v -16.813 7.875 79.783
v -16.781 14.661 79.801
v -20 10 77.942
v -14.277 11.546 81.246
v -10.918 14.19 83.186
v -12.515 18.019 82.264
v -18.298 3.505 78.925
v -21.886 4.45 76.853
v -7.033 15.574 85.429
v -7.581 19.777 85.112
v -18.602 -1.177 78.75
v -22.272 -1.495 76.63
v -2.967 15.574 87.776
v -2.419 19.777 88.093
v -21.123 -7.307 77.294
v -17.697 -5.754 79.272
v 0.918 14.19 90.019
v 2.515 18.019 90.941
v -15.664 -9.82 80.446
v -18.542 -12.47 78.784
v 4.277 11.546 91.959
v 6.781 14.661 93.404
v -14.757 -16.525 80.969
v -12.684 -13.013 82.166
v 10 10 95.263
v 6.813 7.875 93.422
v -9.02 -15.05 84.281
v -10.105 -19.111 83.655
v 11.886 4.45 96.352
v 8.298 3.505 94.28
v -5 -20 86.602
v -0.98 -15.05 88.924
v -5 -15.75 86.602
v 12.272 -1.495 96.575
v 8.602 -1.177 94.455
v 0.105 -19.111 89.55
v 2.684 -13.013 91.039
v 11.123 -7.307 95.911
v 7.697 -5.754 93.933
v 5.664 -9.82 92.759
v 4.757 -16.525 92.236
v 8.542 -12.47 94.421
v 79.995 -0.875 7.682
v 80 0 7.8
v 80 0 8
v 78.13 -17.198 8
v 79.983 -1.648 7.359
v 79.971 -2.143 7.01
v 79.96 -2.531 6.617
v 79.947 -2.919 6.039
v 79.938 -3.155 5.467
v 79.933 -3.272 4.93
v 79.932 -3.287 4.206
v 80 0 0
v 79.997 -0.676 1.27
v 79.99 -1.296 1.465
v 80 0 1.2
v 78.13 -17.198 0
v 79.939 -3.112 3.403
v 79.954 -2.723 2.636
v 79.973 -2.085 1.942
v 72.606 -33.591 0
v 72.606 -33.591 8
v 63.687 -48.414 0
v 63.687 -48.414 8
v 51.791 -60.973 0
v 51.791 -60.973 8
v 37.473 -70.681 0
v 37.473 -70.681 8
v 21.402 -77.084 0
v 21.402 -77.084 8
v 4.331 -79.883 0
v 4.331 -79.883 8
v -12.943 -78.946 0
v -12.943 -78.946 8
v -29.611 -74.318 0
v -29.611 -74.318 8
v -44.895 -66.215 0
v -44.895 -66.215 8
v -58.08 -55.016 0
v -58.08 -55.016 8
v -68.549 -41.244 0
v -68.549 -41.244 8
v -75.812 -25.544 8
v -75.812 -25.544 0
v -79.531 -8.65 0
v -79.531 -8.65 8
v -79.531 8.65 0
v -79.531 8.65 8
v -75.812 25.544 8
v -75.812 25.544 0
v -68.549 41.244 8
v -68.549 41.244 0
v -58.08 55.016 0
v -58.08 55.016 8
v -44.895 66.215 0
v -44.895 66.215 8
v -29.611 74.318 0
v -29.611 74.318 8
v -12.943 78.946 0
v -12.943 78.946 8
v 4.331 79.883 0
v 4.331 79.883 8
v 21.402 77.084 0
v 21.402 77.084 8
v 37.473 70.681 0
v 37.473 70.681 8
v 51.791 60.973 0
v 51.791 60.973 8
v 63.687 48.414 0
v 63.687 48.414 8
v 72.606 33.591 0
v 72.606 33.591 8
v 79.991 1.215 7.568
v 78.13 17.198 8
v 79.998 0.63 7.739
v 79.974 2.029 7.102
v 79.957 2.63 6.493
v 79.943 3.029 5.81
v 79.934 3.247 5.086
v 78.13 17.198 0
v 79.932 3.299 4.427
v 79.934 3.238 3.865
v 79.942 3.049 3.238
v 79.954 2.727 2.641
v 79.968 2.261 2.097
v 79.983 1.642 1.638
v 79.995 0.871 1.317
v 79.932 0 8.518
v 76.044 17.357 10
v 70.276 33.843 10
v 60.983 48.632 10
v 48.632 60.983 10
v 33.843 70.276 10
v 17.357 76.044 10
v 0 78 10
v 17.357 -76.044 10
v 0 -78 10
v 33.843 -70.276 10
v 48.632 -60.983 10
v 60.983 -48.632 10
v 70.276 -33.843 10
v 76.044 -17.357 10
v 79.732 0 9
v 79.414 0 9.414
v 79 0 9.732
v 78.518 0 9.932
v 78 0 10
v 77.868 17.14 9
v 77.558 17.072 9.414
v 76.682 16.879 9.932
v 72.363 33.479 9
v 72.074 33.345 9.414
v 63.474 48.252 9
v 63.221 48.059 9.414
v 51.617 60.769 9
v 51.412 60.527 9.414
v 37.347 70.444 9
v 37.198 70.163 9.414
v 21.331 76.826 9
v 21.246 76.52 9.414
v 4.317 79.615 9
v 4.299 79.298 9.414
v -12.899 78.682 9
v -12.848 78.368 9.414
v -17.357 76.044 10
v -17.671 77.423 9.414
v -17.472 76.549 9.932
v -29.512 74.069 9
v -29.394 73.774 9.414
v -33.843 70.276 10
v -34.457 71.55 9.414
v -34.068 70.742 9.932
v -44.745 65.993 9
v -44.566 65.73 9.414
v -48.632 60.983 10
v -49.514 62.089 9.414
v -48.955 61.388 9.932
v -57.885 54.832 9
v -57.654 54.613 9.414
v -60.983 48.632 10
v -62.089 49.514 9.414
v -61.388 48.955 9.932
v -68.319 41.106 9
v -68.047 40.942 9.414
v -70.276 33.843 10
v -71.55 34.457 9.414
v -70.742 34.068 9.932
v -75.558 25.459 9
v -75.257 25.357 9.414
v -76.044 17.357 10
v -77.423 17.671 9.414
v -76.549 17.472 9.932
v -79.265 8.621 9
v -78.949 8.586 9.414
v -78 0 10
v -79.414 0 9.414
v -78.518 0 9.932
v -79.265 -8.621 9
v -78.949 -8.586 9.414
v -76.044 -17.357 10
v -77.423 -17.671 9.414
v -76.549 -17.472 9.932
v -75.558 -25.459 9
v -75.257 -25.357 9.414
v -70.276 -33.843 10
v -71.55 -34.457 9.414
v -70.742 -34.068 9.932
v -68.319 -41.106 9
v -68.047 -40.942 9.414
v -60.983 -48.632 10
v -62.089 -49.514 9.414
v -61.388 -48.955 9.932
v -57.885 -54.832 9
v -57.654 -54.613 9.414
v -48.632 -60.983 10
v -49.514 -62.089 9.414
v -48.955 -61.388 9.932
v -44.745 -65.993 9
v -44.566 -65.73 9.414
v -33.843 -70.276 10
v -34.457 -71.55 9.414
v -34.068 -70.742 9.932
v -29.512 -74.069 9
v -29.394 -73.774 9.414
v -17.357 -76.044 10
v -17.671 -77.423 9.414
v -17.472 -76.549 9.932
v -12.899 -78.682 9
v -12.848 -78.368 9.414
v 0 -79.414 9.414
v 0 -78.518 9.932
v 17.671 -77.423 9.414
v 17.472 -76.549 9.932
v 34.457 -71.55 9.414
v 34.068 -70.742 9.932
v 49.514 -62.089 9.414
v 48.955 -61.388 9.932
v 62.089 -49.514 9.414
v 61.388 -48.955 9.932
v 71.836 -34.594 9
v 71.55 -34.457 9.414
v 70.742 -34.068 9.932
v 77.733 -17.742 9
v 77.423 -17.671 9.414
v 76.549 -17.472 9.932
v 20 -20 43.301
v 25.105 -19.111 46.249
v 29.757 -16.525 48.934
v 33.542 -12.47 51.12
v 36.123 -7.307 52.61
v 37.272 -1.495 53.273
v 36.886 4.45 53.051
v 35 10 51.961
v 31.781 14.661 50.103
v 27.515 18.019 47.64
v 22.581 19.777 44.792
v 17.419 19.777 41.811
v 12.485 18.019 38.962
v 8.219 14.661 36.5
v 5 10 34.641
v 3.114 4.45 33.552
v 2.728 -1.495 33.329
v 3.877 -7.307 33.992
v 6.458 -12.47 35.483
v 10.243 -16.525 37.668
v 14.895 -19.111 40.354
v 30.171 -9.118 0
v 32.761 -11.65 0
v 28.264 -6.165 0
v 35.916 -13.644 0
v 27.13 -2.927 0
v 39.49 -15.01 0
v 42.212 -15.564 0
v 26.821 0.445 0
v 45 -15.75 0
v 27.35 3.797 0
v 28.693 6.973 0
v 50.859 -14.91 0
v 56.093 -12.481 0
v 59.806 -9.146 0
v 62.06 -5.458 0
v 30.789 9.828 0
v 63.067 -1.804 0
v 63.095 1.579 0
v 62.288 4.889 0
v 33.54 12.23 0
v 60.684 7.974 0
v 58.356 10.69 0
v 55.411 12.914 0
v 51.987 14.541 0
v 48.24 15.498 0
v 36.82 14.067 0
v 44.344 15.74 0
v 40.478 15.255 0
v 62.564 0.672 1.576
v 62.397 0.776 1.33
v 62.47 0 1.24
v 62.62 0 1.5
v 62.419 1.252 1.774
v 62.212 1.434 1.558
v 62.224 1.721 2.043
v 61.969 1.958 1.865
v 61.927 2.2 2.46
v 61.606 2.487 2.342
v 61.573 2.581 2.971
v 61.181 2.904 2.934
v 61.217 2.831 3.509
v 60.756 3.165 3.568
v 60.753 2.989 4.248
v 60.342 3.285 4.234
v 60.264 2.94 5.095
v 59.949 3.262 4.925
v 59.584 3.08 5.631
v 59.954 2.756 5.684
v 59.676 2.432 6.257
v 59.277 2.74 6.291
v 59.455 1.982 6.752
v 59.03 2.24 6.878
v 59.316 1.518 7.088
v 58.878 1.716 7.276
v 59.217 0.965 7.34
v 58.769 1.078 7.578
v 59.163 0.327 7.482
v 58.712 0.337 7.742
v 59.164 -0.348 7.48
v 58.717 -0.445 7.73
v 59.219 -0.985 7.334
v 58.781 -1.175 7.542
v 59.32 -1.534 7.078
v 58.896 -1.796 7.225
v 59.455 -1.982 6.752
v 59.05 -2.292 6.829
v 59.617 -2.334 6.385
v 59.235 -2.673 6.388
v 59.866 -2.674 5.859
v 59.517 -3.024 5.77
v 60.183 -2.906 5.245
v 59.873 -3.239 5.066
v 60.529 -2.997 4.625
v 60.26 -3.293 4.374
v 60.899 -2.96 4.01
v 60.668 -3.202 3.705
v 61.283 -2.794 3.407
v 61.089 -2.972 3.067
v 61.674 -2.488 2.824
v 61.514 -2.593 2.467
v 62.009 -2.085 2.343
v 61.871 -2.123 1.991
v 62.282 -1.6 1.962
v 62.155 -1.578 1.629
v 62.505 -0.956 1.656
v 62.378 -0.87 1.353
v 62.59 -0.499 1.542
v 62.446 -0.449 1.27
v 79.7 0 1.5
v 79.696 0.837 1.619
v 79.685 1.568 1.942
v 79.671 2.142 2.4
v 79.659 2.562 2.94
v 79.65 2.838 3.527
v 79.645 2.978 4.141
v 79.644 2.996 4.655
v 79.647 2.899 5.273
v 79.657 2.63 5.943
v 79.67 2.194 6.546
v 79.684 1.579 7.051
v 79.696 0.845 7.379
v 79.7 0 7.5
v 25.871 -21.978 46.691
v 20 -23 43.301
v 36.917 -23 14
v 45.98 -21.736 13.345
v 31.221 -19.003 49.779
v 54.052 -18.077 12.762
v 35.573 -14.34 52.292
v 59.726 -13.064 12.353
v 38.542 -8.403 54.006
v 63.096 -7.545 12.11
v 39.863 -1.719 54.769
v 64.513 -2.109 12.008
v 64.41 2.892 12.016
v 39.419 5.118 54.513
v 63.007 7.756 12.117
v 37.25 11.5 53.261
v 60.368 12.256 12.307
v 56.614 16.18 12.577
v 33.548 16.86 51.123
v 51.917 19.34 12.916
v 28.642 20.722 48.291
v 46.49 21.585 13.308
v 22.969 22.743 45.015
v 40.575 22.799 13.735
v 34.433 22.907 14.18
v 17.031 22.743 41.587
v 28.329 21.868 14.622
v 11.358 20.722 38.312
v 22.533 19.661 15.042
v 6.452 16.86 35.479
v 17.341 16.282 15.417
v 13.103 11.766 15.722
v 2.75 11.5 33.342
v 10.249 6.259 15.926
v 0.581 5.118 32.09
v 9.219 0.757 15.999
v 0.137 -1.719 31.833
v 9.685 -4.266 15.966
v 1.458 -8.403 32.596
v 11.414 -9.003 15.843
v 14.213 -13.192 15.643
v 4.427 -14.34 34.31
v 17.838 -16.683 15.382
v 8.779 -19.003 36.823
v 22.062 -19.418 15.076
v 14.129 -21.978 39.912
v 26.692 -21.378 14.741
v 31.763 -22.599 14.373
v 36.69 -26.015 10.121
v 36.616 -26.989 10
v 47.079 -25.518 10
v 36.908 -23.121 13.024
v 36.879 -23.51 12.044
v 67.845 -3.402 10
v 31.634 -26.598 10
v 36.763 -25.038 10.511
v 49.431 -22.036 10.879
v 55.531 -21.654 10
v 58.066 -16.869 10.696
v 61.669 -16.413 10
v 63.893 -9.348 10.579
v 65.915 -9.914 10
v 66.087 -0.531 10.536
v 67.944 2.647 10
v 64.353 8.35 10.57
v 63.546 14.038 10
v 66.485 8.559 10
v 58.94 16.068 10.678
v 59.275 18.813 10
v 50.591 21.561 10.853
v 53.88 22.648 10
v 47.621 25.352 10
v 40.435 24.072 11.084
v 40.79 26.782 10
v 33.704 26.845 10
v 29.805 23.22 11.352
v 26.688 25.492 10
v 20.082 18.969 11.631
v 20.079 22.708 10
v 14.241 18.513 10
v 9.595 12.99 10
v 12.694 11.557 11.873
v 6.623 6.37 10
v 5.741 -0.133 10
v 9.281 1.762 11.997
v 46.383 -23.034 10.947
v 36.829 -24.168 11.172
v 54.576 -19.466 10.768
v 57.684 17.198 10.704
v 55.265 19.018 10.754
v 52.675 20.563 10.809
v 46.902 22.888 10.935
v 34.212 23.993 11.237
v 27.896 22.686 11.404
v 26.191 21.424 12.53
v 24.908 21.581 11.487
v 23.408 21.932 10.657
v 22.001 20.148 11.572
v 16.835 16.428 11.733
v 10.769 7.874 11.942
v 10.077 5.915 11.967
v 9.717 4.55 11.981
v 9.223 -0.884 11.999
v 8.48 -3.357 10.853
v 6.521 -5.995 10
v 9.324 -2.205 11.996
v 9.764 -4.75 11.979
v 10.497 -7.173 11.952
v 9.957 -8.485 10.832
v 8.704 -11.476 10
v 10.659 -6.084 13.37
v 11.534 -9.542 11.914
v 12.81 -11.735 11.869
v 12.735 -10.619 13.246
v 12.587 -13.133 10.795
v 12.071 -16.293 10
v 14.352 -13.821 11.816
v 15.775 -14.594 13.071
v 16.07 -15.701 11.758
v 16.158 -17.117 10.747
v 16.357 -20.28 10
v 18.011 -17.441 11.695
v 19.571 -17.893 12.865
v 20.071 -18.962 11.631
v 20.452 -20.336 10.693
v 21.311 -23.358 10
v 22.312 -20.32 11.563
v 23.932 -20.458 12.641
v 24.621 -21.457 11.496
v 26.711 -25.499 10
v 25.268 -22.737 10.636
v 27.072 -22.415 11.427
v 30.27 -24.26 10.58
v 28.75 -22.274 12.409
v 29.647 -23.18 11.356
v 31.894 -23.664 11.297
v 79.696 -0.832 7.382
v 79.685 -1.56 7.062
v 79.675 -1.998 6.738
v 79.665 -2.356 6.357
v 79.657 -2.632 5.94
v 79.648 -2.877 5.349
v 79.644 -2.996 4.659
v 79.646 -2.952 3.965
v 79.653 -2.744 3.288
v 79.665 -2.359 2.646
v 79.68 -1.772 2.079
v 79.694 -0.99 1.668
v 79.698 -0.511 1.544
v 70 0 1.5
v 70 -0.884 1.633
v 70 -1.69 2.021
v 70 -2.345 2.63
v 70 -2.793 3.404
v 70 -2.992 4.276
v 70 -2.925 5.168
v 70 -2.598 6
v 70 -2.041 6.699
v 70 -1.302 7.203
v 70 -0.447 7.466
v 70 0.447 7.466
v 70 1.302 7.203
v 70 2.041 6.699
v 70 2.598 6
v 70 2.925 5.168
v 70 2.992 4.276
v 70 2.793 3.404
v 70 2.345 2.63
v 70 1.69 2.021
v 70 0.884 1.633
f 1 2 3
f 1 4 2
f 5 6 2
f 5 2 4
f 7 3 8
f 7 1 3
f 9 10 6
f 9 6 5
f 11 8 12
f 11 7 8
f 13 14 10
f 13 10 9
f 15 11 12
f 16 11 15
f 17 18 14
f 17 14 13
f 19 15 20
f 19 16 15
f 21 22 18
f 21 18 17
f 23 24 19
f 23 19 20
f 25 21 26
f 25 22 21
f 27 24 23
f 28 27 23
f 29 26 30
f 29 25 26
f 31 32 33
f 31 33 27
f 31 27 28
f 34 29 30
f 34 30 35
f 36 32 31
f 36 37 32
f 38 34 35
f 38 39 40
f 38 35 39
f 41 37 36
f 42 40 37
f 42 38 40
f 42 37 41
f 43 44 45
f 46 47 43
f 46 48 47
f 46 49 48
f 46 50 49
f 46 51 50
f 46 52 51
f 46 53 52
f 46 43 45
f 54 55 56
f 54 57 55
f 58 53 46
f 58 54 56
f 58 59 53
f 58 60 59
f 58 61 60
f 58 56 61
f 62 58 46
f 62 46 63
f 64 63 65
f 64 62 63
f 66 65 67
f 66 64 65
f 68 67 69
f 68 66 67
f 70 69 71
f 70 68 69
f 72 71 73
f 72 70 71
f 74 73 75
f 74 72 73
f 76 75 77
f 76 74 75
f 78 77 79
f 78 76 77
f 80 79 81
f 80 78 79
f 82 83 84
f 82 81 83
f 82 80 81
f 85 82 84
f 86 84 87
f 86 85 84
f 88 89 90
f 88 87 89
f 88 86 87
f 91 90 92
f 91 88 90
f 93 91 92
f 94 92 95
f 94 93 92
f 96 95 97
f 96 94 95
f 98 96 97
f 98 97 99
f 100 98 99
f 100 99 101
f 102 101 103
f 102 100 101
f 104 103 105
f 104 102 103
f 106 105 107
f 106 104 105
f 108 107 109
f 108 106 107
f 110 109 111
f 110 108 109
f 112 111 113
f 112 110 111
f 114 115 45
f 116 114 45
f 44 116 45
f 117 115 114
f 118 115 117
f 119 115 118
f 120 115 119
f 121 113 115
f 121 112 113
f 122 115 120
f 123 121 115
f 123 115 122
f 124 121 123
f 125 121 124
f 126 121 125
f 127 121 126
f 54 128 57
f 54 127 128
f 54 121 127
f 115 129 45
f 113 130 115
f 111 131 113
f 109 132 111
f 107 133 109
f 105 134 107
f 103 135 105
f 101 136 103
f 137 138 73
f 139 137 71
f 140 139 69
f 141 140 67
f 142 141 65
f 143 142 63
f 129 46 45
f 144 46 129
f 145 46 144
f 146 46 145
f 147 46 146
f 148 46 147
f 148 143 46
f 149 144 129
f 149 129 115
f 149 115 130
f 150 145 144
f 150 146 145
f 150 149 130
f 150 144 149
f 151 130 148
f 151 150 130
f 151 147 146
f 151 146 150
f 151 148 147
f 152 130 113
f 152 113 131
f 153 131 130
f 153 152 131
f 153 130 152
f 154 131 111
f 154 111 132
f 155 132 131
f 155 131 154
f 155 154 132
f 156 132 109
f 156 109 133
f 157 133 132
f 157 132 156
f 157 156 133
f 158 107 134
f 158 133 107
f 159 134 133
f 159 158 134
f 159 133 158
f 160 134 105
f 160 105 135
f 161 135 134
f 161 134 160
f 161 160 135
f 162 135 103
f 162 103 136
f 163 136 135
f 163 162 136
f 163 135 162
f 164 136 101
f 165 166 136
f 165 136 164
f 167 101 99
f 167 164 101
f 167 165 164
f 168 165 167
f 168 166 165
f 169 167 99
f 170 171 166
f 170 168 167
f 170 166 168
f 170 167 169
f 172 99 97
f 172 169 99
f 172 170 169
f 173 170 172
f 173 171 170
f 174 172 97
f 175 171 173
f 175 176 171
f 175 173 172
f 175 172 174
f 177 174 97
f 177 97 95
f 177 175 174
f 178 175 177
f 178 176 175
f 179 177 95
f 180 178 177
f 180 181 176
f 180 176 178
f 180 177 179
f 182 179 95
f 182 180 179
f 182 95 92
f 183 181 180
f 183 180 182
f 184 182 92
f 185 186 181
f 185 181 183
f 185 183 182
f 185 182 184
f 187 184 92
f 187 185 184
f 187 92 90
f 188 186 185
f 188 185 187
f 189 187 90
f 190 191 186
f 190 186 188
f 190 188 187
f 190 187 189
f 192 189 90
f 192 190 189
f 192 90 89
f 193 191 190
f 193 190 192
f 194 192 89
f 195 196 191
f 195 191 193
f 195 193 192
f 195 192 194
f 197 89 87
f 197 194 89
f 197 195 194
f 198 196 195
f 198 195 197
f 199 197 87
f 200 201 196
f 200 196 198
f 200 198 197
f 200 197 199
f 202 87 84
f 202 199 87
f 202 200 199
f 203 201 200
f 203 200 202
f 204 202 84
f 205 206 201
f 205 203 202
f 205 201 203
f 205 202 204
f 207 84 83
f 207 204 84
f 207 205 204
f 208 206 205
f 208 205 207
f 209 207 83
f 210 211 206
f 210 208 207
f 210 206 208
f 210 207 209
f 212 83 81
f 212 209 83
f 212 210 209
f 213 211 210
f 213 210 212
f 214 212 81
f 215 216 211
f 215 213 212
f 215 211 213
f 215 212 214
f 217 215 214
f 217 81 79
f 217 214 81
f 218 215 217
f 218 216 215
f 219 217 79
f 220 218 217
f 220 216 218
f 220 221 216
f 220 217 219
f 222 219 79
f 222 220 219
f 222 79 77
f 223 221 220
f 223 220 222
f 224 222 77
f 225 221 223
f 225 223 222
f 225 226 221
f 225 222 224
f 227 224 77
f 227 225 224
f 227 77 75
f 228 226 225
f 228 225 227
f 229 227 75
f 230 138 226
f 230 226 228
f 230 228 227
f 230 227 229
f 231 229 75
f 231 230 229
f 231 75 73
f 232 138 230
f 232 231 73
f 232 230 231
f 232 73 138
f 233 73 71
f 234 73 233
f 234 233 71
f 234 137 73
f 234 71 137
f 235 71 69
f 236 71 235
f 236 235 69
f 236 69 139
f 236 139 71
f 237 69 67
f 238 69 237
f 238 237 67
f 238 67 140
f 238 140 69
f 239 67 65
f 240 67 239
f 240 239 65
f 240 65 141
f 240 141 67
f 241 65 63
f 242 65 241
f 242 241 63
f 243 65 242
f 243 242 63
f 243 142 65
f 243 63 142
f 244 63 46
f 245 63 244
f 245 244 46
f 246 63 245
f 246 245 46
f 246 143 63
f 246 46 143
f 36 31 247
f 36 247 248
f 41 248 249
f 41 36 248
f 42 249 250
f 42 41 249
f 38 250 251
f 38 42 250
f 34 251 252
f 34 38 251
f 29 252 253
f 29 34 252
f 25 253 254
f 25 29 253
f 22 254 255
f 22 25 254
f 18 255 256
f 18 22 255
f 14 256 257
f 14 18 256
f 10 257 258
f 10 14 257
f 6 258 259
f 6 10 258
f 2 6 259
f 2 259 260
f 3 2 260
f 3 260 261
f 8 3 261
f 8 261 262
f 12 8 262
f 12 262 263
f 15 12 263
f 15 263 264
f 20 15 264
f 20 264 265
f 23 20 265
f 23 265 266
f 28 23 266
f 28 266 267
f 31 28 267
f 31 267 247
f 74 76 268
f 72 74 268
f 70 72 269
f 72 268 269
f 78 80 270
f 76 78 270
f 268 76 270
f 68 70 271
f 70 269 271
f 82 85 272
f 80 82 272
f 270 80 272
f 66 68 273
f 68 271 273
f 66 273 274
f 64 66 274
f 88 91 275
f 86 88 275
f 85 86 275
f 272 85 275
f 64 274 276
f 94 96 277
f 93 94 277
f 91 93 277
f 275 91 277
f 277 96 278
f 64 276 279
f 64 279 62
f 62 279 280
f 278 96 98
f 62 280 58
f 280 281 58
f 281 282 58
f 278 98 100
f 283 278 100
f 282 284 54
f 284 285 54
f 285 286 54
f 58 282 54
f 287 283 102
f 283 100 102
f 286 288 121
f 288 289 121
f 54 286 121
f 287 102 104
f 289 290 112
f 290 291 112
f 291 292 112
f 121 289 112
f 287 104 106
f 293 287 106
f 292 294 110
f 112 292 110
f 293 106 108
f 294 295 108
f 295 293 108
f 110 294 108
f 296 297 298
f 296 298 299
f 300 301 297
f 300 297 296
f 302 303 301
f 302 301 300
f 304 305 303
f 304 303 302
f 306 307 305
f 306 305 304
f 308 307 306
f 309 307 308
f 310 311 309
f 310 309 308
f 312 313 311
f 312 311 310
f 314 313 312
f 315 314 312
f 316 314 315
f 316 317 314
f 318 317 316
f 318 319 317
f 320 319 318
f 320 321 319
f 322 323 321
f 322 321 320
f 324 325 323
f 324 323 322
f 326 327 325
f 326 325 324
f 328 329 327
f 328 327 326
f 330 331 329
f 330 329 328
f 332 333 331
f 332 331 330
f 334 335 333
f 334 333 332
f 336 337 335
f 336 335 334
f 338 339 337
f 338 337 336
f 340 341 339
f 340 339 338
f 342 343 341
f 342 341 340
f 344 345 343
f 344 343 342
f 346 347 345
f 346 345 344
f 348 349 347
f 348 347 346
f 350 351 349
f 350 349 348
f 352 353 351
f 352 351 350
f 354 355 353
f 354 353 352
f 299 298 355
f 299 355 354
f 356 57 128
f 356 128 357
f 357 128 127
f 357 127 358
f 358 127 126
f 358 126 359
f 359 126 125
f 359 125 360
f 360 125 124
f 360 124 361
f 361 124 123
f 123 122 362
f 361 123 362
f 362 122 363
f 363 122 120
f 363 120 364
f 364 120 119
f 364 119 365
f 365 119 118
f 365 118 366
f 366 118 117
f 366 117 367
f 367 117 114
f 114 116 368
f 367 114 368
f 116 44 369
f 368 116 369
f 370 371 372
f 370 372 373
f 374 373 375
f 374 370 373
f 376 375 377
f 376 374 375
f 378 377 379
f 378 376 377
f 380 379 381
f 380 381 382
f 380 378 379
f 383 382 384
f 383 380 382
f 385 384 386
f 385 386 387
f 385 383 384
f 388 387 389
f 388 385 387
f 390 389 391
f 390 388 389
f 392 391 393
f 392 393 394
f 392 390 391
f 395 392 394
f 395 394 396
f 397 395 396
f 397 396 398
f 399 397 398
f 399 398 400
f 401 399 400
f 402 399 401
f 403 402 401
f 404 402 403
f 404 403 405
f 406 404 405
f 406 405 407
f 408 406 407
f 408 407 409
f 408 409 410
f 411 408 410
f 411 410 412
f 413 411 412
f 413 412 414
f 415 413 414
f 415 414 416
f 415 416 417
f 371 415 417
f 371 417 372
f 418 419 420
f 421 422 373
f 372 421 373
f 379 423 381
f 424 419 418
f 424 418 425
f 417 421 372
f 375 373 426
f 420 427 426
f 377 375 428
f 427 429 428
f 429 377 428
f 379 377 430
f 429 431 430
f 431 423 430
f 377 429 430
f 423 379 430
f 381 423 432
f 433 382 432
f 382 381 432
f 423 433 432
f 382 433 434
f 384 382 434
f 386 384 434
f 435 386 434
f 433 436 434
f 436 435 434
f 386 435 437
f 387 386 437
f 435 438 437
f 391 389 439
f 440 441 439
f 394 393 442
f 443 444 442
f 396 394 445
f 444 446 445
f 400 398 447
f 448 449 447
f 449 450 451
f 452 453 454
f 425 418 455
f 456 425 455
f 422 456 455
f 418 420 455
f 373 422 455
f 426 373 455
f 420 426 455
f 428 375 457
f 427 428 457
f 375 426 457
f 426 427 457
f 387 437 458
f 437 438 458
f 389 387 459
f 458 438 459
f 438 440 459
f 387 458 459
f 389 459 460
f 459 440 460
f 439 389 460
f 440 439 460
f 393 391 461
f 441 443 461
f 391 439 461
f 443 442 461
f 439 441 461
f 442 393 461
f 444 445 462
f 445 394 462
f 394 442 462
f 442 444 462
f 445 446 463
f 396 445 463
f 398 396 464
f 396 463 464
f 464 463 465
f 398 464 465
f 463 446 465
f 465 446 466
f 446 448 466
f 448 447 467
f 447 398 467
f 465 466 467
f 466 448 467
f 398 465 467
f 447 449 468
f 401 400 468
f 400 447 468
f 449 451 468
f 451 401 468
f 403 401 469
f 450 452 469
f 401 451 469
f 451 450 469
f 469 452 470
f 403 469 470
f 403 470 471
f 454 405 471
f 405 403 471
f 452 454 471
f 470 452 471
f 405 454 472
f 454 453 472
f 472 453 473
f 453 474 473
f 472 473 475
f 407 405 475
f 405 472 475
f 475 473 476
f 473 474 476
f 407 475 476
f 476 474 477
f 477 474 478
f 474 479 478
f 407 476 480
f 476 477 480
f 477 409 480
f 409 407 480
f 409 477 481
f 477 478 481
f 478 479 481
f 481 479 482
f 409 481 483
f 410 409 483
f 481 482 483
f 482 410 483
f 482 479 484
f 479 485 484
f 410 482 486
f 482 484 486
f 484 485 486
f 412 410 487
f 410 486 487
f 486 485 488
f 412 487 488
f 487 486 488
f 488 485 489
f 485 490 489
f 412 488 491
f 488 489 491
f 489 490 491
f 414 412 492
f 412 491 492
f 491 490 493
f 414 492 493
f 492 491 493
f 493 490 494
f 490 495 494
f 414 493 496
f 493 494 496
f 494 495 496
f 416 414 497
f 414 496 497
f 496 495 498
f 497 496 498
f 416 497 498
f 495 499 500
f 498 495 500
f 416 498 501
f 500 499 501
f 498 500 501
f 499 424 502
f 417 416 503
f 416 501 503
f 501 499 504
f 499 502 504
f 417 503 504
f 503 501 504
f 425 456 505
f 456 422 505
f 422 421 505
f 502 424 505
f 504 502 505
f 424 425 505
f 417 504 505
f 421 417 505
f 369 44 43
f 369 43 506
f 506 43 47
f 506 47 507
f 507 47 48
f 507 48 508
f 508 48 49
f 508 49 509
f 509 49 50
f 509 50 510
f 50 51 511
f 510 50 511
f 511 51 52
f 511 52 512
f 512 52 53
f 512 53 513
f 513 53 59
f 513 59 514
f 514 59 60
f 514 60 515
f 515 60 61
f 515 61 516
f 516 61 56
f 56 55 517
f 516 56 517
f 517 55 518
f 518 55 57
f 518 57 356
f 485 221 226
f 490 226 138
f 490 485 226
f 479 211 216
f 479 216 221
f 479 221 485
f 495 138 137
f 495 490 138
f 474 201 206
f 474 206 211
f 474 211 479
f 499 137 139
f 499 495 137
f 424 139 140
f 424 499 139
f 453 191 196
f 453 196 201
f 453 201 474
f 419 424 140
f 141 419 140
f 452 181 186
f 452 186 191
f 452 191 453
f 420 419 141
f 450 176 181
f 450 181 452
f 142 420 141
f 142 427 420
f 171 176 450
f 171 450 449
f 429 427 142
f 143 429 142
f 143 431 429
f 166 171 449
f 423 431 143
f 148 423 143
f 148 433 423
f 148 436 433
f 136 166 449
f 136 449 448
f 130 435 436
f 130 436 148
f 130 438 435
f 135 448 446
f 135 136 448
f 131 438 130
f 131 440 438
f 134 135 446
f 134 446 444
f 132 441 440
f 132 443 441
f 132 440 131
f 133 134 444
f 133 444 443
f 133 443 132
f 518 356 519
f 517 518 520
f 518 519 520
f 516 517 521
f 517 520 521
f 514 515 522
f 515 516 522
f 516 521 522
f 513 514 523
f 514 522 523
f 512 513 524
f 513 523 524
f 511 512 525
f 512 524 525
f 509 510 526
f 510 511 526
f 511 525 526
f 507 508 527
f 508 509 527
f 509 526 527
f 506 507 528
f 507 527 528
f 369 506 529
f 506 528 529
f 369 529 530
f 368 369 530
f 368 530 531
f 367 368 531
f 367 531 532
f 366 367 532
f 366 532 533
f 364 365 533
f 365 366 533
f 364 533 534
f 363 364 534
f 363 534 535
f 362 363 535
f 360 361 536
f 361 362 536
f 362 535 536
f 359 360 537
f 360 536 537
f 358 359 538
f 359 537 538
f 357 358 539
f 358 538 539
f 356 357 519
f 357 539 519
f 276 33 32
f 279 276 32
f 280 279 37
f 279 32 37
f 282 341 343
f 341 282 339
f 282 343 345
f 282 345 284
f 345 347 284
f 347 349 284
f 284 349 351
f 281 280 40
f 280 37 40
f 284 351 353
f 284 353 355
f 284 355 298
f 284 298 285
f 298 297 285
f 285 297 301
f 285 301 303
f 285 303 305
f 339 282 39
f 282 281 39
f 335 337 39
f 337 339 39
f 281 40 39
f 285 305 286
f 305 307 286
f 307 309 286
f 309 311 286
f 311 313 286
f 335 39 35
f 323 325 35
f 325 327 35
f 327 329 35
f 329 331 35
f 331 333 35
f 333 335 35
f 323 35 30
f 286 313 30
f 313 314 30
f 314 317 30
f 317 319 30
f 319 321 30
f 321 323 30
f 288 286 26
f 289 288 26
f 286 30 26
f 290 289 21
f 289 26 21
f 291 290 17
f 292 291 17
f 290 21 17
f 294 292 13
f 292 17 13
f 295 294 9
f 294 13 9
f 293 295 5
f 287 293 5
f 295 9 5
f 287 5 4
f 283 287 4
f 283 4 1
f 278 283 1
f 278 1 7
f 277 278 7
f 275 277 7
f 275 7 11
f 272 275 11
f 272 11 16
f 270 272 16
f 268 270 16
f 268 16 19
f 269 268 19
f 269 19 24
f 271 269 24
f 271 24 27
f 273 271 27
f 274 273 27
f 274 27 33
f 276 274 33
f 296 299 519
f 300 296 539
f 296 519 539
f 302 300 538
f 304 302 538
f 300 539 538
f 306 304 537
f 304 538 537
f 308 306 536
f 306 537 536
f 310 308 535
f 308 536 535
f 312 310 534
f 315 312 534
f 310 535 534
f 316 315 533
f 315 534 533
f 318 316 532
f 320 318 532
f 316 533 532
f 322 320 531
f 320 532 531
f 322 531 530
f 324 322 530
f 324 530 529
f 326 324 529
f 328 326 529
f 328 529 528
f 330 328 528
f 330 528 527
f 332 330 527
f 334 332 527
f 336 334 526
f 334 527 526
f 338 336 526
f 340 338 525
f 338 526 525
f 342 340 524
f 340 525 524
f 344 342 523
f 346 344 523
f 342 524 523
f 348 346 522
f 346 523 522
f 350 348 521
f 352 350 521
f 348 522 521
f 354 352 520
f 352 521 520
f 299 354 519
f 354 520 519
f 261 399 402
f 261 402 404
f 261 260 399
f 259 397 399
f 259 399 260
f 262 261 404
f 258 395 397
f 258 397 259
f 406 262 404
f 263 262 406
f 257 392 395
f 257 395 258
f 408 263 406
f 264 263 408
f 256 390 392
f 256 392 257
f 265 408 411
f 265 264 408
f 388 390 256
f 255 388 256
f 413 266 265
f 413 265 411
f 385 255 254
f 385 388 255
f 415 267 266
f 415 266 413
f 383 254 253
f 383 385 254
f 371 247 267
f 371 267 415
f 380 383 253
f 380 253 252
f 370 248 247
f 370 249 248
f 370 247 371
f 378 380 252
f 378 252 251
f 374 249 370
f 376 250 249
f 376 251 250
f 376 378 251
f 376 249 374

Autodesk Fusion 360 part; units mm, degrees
sketch "Skizze1" plane through (0, 0, 0) normal (0, 0, 1) x (1, 0, 0)
  circle A0 centre (0, 0) radius 80
extrude "Extrusion1" add sketch "Skizze1" along normal blind 10 makes body 1
fillet "Abrundung1" radius 2 1 edges at (-74.5862, -28.9292, 10) on bodies 1
sketch "Skizze2" plane through (0, 0, 0) normal (0, 1, 0) x (1, 0, 0)
  line L0 (45, 0) -> (-5, -86.6025) construction
ref_plane "Arbeitsebene1" through (-5, 0, 86.6025) normal (-0.5, 0, 0.866) x (0, -1, 0)
sketch "Skizze3" plane through (-5, 0, 86.6025) normal (-0.5, 0, 0.866) x (0, -1, 0)
  circle A0 centre (0, 0) radius 23
  circle A1 centre (0, 0) radius 20
extrude "Extrusion5" add sketch "Skizze3" against normal blind 110 separate body contours A0 | A1 makes body 2
combine "Kombinieren1" operation add target body 1 tool bodies 2
extrude "Extrusion6" cut sketch "Skizze3" against normal blind 50 bodies 1
fillet "Abrundung2" radius 4 3 edges at (65.7846, 0, 10) (-74.5862, -28.9292, 8) (-72.7215, 28.206, 10) on bodies 1
sketch "Skizze4" plane through (-5, 0, 86.6025) normal (-0.5, 0, 0.866) x (0, -1, 0)
  circle A0 centre (0, 0) radius 15.75
extrude "Extrusion7" cut sketch "Skizze4" against normal blind 110 bodies 1
sketch "Skizze5" plane through (0, 0, 0) normal (0, 0, 1) x (1, 0, 0)
  circle A0 centre (0, 0) radius 160
extrude "Extrusion8" cut sketch "Skizze5" against normal blind 110 bodies 1
ref_plane "Arbeitsebene2" through (70, 0, 0) normal (1, 0, 0) x (0, 1, 0)
sketch "Skizze6" plane through (70, 0, 0) normal (1, 0, 0) x (0, 0, -1)
  circle A0 centre (-4.5, 0) radius 3
extrude "Extrusion9" cut sketch "Skizze6" along normal mid plane 32 bodies 1
chamfer "Fase1" distance 0.3 angle 45 2 edges at (60.3709, 2.9933, 4.3029) (79.9437, -3, 4.5) on bodies 1
equation "base_plate_diameter = 160 mm"
equation "base_plate_height = 10 mm"
equation "base_plate_rounding = 2 mm"
equation "leg_outer_diameter = 46 mm"
equation "ring_inner_diameter = 40 mm"
equation "ring_extrude_depth = 50 mm"
equation "hole_inner_diameter = 31.5 mm"
equation "leg_length = 100 mm"
equation "leg_angle = 120 deg"
equation "leg_offset = 45 mm"
equation "leg_plate_rounding = 4 mm"
equation "cable_hole_offset = 70 mm"
equation "cable_hole_diameter = 6 mm"
equation "cable_hole_height = 4.5 mm"
equation "cable_hole_chamfer = 0.3 mm"
equation "d16 = base_plate_height"
equation "d19 = base_plate_rounding"
equation "d32 = leg_plate_rounding"
equation "d41 = cable_hole_chamfer"
